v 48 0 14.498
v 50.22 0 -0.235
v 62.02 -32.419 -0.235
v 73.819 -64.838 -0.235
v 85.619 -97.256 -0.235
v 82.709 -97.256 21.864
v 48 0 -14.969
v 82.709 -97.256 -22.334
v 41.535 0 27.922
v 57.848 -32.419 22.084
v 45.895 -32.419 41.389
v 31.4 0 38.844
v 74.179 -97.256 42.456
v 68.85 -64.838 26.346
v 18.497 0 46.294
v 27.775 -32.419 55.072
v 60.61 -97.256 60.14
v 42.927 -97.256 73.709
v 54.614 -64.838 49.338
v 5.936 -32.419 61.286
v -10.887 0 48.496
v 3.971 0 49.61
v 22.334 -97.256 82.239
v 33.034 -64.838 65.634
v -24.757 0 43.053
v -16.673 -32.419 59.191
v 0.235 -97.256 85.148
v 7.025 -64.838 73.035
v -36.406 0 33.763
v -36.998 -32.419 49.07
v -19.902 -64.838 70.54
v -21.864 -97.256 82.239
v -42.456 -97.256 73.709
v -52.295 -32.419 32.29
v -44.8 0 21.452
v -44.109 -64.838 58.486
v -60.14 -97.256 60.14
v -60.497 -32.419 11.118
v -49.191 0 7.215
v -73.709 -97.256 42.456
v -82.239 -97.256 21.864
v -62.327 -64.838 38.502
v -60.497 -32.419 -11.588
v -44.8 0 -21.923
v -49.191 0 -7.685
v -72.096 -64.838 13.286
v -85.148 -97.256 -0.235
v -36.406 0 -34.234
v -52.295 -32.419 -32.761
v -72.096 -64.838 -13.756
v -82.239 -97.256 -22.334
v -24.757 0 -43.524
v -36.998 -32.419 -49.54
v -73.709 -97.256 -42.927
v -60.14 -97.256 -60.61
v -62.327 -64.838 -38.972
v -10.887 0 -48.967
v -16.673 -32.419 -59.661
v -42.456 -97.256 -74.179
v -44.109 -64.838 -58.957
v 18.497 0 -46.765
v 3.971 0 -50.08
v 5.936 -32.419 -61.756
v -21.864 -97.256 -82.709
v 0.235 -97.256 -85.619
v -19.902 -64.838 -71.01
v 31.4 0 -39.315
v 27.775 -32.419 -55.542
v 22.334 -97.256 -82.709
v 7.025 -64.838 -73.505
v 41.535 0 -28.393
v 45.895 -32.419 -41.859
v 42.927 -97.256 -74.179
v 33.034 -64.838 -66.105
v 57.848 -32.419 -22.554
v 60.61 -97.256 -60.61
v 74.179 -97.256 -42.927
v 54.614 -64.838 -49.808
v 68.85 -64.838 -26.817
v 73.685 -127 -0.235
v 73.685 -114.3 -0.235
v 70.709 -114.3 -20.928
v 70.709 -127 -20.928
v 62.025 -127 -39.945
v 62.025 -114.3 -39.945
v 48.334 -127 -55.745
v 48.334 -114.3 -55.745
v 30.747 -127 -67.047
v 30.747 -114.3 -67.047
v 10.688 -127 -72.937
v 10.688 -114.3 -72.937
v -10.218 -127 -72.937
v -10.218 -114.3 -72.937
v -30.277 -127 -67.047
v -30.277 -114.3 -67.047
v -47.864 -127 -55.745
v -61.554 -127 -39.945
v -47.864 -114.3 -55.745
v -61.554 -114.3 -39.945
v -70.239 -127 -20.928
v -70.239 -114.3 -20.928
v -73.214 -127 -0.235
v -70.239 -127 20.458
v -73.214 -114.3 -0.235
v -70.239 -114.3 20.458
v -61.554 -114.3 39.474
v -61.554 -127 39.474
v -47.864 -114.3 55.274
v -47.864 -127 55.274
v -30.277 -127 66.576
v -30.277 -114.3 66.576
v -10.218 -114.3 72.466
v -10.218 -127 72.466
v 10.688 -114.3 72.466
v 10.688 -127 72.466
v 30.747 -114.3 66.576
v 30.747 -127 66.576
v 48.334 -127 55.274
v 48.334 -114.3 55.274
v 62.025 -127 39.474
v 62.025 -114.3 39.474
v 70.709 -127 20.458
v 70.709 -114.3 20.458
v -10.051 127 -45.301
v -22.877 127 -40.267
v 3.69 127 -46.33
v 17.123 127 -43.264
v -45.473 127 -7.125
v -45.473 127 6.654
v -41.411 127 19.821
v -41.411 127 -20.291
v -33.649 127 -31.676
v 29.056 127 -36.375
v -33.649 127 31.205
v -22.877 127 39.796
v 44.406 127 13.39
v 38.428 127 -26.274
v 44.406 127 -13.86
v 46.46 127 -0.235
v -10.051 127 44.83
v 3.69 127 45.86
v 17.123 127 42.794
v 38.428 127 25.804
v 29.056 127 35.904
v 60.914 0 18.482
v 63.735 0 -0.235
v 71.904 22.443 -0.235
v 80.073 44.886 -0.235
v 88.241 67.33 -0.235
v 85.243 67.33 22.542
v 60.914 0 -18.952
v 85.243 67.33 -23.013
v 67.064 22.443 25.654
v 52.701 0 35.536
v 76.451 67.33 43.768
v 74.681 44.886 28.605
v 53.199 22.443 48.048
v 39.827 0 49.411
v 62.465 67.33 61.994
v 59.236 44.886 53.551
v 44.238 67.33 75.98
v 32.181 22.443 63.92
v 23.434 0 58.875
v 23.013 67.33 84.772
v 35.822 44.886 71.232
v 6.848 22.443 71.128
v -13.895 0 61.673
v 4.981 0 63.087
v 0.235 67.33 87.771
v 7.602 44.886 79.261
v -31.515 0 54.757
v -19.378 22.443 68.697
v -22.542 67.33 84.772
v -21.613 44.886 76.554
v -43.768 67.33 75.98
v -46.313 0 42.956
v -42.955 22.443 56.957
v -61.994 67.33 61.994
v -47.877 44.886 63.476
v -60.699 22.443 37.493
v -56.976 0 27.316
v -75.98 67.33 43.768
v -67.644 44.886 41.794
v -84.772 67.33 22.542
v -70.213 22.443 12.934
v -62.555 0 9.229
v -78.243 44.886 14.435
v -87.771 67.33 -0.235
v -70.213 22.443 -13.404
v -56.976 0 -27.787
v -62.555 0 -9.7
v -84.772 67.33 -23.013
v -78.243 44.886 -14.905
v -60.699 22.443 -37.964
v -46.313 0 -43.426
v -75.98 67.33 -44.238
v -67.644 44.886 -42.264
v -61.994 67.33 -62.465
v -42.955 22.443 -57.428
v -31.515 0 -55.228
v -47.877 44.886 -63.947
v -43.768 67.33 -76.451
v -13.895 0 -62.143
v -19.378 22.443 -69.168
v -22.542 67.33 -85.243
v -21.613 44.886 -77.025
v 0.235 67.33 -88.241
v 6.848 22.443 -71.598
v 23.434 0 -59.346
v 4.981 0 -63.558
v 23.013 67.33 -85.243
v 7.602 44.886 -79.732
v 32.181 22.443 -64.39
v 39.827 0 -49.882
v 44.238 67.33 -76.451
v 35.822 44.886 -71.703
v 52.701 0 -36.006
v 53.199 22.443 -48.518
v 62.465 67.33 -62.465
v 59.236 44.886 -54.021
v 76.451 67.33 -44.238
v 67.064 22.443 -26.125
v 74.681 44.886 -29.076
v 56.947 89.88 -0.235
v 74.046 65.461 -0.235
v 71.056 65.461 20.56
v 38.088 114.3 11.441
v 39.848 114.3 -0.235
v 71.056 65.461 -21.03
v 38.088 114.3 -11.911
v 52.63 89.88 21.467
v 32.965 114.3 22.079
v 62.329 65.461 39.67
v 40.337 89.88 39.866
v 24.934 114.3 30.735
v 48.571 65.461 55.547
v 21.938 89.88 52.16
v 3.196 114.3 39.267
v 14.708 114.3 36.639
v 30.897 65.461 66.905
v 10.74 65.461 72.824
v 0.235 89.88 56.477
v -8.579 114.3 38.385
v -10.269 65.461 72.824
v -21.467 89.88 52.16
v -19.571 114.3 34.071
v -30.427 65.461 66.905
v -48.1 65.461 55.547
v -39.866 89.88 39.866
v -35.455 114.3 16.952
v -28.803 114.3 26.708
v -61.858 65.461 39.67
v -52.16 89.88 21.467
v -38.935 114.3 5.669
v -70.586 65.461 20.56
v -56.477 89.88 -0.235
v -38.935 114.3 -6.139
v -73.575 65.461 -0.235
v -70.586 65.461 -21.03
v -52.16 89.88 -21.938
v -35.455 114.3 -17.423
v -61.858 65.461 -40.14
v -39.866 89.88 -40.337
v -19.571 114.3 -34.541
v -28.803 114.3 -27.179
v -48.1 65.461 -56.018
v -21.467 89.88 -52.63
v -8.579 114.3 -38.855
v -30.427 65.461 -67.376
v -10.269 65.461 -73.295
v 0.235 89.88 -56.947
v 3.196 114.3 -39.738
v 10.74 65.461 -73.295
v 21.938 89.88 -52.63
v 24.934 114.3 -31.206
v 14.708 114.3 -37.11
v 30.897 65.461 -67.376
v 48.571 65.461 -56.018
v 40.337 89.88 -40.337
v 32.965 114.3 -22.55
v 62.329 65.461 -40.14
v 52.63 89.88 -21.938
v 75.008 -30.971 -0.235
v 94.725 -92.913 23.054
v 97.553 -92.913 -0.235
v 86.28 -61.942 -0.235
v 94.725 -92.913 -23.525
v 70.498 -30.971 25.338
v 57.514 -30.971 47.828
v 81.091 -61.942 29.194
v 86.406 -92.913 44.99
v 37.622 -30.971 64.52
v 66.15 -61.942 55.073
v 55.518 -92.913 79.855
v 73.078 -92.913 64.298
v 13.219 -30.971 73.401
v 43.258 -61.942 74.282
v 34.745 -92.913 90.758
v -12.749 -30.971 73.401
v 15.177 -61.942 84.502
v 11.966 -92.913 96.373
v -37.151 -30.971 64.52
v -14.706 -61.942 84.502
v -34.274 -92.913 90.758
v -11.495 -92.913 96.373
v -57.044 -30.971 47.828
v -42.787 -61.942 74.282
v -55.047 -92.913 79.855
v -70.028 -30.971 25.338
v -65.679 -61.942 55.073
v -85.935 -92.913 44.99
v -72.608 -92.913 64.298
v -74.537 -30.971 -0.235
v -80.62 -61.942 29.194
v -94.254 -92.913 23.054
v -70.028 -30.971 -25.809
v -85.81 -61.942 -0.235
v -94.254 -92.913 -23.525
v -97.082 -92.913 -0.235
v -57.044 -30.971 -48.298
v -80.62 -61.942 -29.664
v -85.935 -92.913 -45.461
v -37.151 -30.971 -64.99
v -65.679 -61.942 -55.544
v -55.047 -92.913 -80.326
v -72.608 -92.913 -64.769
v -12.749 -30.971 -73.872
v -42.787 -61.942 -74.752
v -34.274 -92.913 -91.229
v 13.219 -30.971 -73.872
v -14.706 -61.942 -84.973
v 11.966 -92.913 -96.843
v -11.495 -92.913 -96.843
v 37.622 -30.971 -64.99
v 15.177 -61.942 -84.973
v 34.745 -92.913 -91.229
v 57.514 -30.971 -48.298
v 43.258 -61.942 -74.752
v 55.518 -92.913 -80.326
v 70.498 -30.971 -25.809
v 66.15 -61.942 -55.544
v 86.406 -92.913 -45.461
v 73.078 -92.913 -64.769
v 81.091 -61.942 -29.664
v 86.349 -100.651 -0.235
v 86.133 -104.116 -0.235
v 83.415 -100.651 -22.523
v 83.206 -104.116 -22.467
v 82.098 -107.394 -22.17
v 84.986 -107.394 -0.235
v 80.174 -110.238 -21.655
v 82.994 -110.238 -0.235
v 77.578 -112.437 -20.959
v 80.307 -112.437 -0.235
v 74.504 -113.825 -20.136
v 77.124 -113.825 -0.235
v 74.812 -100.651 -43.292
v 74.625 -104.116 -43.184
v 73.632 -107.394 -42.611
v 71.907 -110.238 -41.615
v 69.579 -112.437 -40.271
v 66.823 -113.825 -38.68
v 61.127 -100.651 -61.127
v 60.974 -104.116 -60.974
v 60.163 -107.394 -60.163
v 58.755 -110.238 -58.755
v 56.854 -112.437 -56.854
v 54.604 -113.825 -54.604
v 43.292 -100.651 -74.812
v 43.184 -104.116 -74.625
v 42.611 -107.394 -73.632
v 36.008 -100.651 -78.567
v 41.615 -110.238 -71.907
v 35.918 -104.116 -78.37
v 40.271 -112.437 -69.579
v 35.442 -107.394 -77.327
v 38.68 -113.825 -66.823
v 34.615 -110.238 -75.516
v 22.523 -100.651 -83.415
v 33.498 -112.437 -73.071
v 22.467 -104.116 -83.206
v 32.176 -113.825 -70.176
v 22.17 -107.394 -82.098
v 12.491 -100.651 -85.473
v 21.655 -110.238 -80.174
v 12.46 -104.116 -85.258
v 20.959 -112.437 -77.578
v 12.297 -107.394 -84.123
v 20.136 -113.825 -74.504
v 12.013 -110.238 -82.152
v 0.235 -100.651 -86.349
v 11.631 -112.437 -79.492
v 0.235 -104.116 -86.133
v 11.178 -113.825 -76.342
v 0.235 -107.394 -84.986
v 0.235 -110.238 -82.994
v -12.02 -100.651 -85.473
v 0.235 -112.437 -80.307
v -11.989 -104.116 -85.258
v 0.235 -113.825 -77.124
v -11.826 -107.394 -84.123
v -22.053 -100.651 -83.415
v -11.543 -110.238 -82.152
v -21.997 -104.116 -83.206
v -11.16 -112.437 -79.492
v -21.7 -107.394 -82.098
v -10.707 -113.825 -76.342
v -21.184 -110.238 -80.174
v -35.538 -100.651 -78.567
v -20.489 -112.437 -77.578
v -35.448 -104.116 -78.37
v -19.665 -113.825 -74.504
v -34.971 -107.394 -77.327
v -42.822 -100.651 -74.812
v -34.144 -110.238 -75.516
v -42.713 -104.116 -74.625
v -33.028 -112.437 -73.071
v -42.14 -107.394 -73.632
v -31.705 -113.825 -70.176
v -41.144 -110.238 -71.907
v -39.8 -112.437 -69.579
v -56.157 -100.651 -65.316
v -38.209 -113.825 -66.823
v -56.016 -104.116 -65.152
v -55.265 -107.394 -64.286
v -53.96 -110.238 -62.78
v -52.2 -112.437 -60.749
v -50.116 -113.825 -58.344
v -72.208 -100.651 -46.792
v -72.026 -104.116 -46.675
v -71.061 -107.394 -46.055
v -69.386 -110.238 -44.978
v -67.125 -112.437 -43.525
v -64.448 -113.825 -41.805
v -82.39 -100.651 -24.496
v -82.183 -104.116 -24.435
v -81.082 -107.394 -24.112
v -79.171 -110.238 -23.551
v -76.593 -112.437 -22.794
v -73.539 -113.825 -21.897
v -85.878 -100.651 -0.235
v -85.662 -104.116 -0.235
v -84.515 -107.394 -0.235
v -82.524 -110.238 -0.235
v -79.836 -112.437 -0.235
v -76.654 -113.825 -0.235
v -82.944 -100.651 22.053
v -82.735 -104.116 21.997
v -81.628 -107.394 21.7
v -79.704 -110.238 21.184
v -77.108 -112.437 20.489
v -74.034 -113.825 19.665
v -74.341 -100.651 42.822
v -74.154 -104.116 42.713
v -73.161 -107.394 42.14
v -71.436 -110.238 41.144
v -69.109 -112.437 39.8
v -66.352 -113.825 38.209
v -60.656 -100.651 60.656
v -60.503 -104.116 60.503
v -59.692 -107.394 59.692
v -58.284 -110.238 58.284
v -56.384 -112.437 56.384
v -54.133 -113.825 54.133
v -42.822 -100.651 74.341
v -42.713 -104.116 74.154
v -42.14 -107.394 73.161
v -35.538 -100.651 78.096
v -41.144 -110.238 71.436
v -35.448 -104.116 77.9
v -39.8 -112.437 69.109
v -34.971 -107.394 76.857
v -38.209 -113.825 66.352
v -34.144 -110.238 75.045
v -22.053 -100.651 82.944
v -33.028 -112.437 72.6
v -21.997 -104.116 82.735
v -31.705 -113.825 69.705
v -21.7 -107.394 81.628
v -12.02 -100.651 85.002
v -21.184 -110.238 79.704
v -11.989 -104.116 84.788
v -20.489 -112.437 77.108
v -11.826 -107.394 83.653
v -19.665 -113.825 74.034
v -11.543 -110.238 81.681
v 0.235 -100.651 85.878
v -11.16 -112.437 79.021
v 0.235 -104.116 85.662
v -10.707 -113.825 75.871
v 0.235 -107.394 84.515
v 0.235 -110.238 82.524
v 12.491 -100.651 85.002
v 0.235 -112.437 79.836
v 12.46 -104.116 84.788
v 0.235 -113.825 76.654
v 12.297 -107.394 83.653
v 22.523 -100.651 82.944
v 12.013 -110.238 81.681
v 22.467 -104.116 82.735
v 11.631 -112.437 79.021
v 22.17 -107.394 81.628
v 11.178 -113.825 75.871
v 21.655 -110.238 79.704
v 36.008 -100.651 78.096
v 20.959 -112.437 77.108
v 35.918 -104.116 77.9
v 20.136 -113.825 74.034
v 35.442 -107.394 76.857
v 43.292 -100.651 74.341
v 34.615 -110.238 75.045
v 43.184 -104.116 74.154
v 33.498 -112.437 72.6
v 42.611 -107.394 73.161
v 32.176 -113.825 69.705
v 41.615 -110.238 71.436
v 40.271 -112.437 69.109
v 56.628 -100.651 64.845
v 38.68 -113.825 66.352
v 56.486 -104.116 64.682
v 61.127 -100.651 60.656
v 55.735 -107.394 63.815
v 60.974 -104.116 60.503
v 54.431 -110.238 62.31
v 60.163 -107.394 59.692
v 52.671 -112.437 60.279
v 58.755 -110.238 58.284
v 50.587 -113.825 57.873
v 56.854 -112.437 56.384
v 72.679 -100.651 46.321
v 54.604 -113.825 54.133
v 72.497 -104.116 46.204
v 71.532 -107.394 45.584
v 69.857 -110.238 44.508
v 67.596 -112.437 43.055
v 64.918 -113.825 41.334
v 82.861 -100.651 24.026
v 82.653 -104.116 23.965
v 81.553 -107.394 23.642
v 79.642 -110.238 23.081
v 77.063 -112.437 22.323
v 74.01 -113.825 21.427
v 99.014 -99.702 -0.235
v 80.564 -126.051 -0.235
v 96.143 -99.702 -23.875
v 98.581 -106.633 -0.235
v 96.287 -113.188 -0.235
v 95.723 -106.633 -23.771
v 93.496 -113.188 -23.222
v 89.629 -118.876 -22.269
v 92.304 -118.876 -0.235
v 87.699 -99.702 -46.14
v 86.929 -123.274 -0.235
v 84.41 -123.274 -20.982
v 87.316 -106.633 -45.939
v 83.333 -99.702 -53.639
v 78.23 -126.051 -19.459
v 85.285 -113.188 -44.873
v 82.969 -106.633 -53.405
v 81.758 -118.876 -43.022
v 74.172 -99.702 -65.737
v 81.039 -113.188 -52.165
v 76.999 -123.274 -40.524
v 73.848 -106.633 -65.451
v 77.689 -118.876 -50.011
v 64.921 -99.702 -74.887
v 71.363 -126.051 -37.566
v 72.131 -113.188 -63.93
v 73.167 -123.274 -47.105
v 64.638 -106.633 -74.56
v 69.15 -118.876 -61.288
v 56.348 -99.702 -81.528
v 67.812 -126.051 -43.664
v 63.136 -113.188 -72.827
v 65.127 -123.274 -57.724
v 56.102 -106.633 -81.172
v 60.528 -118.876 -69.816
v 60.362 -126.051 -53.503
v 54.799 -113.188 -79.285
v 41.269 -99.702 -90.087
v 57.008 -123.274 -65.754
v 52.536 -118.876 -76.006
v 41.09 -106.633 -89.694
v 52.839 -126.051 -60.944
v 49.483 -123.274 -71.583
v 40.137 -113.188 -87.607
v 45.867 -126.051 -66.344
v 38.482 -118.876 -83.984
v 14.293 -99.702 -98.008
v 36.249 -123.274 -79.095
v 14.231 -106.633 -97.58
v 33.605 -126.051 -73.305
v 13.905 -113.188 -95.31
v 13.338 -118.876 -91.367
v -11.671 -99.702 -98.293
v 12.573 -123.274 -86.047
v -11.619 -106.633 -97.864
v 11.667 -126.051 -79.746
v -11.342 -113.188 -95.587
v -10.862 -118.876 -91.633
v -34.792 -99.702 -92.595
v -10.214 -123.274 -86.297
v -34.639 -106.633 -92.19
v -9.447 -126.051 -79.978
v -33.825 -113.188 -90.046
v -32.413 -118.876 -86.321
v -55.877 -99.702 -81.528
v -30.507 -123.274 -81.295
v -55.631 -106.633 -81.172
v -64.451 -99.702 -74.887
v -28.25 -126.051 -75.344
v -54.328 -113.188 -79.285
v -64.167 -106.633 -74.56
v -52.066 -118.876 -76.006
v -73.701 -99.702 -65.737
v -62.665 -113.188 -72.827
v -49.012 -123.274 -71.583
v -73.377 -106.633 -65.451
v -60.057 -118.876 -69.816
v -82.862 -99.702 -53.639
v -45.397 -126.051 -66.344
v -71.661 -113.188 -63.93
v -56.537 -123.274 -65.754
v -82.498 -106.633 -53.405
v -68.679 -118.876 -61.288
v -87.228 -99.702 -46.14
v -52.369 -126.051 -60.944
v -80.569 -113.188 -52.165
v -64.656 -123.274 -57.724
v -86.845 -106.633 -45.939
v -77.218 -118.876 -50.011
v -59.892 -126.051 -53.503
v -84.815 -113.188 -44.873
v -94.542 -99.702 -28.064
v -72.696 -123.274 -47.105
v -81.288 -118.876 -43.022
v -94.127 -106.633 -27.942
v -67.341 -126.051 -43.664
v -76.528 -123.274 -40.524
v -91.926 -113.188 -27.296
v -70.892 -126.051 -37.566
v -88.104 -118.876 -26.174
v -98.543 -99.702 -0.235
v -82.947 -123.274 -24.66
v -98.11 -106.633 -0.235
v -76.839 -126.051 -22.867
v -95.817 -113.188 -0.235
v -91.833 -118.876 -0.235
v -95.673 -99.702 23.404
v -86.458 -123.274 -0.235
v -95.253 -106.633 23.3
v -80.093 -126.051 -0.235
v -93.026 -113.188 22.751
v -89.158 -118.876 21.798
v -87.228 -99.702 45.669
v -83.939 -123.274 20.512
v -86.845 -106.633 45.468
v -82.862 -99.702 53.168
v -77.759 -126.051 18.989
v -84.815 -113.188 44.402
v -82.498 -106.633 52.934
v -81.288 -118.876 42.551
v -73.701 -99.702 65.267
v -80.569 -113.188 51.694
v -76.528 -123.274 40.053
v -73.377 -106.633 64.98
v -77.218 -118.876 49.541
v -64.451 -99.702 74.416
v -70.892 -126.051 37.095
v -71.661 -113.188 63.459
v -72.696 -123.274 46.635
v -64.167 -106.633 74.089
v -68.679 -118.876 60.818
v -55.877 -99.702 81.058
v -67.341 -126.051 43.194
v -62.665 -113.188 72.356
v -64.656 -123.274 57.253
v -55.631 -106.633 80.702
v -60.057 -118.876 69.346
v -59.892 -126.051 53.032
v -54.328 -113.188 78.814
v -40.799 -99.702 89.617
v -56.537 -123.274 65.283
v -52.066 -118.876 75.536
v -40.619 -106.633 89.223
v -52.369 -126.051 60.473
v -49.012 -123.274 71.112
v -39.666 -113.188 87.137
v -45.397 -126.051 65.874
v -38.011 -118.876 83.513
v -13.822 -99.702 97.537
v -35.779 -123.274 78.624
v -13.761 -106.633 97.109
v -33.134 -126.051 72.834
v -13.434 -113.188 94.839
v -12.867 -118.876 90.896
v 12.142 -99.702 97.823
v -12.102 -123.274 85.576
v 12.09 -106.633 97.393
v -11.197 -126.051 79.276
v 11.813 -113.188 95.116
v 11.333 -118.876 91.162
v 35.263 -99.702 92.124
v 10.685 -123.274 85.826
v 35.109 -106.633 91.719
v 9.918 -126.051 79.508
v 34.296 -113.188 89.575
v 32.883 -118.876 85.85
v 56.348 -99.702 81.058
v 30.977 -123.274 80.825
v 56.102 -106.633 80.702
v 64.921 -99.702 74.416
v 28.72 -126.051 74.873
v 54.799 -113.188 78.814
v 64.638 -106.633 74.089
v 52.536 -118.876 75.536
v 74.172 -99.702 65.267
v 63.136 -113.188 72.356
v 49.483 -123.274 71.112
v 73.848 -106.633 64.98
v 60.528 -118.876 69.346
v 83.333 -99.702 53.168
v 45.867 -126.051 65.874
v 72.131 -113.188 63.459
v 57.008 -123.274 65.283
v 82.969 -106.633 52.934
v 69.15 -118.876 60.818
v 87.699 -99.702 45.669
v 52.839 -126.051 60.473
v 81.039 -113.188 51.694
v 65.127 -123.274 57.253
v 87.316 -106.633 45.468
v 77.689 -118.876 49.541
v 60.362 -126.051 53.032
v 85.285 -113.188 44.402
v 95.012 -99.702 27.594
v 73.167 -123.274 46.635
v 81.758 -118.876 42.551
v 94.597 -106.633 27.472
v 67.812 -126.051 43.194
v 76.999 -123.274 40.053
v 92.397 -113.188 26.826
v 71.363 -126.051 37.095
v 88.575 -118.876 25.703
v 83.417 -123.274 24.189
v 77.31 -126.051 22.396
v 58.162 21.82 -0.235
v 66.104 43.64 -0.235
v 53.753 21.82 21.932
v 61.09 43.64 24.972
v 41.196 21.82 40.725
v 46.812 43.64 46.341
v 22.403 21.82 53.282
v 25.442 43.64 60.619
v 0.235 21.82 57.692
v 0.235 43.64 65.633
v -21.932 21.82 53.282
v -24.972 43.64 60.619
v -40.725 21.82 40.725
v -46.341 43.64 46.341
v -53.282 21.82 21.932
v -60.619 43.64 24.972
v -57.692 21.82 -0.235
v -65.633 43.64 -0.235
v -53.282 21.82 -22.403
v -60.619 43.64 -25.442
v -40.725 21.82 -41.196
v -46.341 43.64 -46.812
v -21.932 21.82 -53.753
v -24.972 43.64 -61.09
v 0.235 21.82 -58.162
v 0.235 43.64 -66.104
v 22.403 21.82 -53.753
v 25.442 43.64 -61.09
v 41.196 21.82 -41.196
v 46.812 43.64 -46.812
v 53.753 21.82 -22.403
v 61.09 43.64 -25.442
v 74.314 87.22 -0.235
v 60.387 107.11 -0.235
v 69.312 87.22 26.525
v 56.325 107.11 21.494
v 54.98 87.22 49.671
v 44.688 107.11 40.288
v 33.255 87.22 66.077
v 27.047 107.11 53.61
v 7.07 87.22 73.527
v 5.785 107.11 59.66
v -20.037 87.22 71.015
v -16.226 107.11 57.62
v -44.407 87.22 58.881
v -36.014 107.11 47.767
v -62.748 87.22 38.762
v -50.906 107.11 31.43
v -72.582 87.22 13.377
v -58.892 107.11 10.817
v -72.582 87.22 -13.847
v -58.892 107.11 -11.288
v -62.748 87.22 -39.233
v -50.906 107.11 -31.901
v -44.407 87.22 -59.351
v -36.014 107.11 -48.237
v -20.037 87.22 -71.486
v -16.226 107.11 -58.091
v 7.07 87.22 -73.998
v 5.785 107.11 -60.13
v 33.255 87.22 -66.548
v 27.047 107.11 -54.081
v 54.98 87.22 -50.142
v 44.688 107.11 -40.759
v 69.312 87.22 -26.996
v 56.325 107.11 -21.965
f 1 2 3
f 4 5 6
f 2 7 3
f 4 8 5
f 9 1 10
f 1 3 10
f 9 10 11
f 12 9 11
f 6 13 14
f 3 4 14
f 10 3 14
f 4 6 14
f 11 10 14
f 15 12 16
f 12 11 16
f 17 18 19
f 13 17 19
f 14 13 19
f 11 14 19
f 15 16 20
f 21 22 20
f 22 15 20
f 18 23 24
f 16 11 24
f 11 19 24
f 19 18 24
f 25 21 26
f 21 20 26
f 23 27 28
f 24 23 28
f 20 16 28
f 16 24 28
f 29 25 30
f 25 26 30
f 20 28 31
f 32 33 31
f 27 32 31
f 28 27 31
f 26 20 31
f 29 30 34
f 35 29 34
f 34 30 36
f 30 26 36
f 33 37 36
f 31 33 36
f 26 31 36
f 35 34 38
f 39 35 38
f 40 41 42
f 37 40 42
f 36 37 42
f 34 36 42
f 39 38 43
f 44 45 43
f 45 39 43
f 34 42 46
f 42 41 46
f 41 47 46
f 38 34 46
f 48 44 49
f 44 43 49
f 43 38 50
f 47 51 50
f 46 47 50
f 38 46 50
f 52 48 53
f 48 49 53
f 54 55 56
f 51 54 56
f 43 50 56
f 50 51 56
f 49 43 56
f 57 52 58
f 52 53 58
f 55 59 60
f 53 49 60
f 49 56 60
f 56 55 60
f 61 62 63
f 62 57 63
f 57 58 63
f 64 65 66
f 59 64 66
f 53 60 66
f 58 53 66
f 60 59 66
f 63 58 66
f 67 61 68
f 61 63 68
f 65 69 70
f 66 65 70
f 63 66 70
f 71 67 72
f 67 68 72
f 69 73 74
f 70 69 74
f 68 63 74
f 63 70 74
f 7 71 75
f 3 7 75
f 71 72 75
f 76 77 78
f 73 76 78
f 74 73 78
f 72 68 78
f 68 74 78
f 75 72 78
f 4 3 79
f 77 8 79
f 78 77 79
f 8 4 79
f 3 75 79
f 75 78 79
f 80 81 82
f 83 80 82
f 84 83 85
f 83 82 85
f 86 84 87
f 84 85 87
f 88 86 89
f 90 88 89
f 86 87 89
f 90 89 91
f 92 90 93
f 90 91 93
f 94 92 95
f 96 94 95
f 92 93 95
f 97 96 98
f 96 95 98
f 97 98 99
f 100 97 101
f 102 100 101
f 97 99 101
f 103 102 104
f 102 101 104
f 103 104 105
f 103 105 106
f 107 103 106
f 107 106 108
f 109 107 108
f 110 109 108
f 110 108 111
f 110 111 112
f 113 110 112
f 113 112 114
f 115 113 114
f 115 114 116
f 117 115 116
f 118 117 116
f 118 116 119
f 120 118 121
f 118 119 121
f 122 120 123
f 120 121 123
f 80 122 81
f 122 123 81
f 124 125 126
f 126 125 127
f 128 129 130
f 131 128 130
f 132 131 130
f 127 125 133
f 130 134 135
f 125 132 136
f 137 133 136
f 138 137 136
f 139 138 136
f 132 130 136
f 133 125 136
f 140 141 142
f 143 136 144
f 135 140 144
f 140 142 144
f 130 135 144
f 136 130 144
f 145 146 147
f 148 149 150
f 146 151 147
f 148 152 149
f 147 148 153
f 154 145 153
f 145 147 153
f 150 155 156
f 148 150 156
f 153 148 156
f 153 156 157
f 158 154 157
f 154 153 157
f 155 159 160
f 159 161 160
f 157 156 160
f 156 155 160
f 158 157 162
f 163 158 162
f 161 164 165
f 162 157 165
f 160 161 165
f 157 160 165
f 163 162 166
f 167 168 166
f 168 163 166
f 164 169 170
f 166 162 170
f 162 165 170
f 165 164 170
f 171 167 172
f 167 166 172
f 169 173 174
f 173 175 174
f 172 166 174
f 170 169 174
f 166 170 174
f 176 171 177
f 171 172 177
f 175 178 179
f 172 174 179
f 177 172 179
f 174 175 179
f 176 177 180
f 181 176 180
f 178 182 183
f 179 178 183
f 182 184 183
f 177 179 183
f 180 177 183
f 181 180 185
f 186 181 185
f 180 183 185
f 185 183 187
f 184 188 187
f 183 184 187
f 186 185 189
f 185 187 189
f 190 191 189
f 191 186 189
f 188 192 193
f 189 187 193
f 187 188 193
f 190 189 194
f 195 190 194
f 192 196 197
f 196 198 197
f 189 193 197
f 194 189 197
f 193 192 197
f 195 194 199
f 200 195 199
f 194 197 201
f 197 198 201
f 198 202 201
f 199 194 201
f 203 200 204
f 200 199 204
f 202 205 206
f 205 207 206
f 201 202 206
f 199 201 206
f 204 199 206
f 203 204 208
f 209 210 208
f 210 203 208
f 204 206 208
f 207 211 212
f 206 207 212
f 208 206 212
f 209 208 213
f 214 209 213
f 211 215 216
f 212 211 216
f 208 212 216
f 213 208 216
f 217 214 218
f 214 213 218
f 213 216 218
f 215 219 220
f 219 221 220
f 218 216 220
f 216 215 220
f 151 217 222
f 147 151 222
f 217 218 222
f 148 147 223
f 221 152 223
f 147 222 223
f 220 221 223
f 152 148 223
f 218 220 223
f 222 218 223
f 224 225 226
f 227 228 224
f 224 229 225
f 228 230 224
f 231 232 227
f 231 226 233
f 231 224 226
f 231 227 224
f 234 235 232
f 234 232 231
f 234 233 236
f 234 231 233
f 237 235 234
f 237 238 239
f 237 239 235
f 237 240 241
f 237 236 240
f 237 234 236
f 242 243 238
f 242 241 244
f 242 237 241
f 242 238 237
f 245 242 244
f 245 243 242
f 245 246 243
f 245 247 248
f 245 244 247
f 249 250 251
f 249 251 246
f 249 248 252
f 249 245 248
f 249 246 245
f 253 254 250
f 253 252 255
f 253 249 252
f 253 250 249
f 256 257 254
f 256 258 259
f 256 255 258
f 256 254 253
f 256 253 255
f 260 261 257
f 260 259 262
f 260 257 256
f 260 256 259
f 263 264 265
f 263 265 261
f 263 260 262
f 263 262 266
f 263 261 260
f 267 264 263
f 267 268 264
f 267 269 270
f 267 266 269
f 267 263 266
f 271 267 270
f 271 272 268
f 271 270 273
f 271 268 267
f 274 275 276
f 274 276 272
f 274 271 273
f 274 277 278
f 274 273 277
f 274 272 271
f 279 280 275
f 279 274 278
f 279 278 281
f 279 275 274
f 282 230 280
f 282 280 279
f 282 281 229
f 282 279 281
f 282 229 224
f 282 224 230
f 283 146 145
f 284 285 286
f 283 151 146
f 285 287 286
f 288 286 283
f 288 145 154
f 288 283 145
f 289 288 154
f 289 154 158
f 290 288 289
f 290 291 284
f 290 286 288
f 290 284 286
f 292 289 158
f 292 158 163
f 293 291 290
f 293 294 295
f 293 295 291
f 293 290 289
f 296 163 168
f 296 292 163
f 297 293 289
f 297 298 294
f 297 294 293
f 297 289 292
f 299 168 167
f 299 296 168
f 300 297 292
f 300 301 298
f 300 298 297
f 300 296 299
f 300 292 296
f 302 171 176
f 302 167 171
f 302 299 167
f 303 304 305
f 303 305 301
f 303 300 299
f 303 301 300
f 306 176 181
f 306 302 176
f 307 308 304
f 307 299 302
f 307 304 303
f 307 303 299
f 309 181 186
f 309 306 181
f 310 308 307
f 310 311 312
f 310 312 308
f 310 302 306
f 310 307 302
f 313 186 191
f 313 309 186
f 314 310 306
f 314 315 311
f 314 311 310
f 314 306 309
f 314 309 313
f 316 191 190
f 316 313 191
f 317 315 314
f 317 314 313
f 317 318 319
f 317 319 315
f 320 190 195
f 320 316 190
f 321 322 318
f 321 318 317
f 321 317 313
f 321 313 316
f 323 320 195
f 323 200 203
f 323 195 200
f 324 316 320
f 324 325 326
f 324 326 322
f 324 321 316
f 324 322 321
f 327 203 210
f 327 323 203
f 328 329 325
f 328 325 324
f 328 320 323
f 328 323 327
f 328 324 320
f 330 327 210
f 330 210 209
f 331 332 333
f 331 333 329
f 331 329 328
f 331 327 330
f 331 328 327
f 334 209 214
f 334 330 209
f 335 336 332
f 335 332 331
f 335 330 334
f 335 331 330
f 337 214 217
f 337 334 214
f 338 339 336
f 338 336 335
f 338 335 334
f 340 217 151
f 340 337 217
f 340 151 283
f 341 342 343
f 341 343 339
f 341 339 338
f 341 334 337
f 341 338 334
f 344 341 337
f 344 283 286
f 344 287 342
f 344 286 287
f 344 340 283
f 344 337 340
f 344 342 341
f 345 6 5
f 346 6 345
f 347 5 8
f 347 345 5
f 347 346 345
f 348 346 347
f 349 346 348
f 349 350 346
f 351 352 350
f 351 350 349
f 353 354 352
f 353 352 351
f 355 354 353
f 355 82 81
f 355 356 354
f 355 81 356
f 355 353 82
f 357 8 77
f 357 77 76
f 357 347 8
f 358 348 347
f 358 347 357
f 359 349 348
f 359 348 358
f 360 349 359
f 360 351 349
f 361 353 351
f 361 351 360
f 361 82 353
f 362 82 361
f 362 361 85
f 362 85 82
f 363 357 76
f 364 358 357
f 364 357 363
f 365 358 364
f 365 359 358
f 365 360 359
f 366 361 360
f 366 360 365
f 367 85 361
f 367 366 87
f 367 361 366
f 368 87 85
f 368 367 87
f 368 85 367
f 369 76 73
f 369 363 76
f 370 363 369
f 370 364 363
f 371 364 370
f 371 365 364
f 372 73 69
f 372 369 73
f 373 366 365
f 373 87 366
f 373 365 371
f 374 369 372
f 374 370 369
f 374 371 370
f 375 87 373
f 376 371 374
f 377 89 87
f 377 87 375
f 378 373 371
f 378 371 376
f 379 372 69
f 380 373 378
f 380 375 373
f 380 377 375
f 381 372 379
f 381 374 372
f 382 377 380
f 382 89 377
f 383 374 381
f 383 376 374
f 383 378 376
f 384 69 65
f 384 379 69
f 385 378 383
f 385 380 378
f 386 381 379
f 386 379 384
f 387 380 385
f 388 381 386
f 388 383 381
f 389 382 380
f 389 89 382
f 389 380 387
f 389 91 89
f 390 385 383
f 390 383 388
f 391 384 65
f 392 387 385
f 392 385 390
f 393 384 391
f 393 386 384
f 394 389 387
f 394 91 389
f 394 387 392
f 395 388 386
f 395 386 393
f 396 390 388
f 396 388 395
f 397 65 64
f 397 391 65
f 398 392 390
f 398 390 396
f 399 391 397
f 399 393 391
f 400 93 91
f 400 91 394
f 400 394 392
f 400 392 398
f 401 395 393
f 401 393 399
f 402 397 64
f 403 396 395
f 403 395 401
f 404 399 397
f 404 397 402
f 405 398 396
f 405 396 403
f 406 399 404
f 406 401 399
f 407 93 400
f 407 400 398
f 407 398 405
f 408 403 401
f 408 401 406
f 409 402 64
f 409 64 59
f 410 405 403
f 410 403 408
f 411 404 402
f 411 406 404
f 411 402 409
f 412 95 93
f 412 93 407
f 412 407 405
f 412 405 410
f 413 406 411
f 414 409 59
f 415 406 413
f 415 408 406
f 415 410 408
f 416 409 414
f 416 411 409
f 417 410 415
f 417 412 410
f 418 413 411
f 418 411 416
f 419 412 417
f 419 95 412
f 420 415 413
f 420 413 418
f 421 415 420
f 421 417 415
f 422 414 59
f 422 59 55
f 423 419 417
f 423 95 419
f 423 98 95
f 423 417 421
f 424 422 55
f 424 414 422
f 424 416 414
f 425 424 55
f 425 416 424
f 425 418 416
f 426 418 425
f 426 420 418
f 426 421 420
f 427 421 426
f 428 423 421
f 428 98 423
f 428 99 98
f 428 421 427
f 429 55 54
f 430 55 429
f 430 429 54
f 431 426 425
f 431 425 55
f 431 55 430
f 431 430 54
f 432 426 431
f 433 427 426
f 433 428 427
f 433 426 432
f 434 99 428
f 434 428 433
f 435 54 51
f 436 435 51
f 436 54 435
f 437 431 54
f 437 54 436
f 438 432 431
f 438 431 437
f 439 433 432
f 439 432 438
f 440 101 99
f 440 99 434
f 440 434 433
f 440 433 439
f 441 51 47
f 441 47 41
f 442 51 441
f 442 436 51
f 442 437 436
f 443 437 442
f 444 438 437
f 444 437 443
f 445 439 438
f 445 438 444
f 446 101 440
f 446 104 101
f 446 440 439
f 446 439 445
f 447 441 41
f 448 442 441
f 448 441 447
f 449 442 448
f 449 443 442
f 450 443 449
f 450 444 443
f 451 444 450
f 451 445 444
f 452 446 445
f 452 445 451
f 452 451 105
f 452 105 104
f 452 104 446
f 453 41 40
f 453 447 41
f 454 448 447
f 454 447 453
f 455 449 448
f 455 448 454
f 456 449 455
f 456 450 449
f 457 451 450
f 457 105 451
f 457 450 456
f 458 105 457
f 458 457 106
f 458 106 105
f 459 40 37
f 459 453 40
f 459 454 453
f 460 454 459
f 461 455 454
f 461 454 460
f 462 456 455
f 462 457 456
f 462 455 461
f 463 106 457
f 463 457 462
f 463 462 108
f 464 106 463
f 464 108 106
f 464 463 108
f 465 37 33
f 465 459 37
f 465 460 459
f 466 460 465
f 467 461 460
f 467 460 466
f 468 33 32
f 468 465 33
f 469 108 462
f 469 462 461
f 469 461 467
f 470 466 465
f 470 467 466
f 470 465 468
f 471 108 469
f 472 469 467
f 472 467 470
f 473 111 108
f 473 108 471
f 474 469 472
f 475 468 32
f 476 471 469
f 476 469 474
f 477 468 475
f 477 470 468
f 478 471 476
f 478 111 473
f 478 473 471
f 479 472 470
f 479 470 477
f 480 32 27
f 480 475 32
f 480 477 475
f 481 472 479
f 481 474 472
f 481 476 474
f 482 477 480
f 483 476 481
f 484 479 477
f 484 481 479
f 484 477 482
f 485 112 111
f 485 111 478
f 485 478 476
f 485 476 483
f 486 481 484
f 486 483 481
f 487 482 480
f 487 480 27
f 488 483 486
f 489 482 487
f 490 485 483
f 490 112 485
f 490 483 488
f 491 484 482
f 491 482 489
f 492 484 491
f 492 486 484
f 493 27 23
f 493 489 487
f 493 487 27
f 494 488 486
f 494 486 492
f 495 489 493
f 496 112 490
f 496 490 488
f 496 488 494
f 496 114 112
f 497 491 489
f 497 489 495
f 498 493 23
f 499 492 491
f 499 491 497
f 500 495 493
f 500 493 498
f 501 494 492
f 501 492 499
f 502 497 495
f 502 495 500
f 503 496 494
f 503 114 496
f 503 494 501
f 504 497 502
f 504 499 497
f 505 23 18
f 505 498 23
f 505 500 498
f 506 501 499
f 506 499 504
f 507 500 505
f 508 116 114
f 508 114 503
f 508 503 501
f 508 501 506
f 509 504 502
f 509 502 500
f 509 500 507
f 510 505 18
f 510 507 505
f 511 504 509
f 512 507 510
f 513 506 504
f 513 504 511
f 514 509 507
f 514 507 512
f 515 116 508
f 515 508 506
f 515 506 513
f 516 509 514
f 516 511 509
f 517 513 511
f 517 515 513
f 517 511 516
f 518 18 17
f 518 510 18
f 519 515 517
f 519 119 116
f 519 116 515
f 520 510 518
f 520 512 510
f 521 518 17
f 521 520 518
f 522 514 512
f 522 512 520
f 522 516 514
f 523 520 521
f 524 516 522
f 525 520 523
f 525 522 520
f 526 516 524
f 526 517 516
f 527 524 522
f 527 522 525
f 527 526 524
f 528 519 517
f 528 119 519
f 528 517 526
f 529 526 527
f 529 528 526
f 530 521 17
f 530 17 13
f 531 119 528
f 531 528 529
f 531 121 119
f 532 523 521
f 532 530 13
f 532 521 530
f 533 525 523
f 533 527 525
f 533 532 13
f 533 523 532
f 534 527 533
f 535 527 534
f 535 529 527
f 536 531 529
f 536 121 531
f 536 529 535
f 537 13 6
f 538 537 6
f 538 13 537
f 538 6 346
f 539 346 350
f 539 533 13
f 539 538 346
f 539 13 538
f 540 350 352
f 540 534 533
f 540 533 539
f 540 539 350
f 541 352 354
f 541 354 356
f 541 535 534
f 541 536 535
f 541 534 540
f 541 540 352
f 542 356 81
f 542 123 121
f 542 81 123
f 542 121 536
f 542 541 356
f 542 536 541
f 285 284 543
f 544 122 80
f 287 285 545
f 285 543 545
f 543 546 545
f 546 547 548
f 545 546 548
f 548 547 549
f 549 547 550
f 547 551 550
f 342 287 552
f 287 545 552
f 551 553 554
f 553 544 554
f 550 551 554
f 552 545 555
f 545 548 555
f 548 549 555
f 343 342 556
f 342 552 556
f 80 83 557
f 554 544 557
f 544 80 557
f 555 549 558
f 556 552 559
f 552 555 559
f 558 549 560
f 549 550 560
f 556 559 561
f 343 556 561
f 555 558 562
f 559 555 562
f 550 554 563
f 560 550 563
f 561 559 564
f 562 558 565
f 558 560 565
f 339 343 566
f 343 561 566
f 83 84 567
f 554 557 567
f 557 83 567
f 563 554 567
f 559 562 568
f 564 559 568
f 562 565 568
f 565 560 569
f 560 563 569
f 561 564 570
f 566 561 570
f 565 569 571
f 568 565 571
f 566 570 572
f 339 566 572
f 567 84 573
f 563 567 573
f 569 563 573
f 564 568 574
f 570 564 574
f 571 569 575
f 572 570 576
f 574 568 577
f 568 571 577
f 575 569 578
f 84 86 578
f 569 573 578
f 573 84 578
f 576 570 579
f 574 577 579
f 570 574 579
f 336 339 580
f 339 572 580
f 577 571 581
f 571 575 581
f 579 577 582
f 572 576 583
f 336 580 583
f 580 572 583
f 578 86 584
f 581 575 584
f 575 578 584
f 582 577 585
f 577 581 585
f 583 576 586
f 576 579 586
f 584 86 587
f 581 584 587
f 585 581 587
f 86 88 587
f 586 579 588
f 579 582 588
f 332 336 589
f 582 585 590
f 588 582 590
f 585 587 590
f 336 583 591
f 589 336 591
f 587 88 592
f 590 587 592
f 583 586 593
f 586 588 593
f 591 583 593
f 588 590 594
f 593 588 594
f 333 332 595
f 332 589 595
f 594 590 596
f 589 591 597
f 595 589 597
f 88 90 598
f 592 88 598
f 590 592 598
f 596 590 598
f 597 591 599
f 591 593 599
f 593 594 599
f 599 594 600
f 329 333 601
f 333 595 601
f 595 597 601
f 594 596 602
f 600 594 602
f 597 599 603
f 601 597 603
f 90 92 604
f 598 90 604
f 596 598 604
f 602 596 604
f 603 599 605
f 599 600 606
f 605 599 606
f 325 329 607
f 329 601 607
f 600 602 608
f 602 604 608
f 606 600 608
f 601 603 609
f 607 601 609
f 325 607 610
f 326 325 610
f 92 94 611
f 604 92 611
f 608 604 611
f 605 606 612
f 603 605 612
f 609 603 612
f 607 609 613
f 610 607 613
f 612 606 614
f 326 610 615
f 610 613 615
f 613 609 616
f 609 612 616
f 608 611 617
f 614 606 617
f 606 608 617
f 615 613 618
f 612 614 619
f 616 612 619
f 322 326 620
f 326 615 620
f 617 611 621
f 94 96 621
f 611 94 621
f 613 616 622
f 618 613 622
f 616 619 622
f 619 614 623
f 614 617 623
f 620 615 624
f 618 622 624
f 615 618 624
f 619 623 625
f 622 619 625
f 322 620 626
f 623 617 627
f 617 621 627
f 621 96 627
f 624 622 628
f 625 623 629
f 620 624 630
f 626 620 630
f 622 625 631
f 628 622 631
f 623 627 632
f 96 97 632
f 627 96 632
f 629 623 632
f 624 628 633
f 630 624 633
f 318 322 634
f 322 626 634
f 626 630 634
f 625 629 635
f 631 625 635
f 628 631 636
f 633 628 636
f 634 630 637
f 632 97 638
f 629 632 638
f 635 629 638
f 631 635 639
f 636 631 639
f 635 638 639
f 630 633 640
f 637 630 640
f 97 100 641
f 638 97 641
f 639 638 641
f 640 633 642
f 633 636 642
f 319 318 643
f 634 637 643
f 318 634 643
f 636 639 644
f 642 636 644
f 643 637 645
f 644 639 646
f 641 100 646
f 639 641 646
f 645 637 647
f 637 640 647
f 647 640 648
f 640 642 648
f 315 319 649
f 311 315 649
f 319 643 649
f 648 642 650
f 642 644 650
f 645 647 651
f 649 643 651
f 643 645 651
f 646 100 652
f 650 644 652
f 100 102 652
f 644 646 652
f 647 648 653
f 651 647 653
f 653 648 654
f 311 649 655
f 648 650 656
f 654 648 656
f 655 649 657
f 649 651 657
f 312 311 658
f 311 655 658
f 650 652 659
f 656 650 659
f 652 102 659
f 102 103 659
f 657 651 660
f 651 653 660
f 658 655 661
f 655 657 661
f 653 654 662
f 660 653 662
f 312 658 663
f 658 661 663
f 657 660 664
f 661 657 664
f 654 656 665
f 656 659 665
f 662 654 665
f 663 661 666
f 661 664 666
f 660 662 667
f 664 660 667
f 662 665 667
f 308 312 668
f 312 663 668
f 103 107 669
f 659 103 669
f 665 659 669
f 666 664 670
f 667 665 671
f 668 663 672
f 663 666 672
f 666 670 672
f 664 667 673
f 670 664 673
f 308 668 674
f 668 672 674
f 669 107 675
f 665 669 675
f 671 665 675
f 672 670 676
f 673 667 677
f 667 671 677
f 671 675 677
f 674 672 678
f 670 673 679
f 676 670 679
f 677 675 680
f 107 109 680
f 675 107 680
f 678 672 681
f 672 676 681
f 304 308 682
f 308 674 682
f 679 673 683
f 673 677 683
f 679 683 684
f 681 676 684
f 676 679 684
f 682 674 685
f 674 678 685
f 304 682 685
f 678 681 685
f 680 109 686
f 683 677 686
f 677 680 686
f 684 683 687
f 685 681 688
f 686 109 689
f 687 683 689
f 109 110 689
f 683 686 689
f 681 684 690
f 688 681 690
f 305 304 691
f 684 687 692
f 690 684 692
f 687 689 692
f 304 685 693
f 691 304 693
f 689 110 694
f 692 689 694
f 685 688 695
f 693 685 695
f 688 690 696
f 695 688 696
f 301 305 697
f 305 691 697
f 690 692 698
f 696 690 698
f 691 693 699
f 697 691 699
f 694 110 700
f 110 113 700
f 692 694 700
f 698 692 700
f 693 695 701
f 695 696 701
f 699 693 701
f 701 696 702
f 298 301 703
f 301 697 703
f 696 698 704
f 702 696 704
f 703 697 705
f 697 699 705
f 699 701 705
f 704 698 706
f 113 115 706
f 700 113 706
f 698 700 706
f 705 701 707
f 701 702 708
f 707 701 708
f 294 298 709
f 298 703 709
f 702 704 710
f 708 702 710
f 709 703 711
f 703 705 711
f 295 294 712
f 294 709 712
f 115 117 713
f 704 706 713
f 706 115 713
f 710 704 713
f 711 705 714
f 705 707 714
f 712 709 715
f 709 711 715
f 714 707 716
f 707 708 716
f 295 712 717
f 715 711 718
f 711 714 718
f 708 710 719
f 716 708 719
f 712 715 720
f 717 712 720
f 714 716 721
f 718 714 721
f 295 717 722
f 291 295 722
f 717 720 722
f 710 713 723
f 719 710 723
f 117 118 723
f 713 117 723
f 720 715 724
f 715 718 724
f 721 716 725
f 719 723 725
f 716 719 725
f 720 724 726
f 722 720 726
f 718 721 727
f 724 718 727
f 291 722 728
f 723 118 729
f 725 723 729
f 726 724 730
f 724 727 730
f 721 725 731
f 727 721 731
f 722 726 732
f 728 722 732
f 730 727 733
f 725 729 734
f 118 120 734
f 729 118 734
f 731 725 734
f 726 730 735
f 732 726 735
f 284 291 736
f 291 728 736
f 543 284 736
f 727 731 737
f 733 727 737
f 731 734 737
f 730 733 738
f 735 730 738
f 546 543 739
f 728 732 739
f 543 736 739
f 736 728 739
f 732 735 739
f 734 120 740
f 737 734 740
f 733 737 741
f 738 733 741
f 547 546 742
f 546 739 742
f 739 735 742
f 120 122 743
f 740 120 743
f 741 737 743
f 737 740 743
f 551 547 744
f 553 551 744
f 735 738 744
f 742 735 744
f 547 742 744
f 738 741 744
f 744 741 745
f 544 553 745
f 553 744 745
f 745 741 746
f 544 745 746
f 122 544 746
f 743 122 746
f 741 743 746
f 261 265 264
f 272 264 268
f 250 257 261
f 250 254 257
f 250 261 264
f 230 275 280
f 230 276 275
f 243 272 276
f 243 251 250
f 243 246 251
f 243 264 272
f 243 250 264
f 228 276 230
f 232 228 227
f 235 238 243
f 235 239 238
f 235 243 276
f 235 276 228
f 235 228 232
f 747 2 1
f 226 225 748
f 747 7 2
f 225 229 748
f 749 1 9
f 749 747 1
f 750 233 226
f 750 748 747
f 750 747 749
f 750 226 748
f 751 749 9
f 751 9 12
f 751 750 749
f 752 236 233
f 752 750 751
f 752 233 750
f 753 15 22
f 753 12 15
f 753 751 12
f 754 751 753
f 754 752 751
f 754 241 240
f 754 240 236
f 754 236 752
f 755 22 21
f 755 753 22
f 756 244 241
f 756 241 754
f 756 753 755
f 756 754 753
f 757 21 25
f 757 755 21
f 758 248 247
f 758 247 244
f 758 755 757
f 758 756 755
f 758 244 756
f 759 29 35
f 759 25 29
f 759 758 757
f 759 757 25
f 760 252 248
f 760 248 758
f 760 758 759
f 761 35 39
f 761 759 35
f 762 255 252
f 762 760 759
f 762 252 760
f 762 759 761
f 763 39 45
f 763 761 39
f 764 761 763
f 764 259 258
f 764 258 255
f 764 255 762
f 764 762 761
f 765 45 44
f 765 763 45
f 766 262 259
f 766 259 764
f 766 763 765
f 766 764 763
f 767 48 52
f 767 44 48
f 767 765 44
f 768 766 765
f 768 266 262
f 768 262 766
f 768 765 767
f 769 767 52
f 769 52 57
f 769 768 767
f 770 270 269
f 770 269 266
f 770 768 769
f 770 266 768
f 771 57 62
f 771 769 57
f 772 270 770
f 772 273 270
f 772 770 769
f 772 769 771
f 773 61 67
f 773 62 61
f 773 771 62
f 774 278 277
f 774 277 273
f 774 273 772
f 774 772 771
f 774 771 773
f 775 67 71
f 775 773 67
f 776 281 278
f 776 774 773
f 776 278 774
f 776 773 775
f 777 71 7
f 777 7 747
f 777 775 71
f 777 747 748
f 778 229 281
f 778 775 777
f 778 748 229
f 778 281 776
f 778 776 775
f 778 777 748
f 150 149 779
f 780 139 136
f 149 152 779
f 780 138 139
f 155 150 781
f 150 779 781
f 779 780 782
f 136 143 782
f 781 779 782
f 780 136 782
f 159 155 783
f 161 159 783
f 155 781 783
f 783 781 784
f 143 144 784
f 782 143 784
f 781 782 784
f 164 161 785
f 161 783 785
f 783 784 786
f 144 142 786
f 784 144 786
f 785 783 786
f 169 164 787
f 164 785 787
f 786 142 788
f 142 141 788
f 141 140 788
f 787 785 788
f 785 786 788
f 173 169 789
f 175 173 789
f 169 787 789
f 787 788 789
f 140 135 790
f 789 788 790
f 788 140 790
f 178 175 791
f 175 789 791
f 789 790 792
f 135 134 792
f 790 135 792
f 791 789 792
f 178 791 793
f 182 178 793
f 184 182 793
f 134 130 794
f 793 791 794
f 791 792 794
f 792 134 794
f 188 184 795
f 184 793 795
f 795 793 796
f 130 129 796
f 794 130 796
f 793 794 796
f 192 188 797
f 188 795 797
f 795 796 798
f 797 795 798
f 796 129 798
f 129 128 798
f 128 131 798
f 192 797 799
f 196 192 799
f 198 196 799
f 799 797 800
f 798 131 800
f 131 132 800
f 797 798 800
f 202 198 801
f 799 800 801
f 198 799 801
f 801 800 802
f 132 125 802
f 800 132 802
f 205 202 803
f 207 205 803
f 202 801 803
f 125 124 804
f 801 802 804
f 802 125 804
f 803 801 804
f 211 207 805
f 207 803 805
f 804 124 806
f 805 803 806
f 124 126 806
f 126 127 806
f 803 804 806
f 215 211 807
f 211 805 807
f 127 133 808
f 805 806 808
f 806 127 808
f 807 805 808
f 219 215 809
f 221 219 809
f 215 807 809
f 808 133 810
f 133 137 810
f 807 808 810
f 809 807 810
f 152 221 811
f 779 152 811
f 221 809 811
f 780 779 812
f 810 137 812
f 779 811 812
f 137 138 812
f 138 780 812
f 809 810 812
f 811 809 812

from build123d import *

# Parameters (mm, degrees)
F0_R     = 63.5
F1_DEPTH = 127
F1_TAPER = -20
F2_R     = 25.4
F3_SIZE  = 63.5
F4_T     = -12.7


# Not quite as in the source:
# - a shell that OpenCascade refuses in one call is made with other operations: the cavity is built on its own and cut out


with BuildPart() as f1:
    # F0 (on Front) → F1 (new body, symmetric)
    with BuildSketch(Plane.XZ):
        with Locations((0.2353243763, -0.2353235031)):
            Circle(F0_R)
    extrude(amount=F1_DEPTH, both=True, taper=F1_TAPER)

    # F2
    f2_edges = [f1.edges().sort_by_distance(p)[0] for p in [
        (-109.488895, -127, -0.235324),
    ]]
    fillet(f2_edges, radius=F2_R)

    # F3
    f3_edges = [f1.edges().sort_by_distance(p)[0] for p in [
        (-109.488895, 127, -0.235324),
    ]]
    chamfer(f3_edges, length=F3_SIZE)

    # F4: a shell. OpenCascade refuses it in one call, so the cavity is built on its own and cut out:
    # the body offset inwards by the wall thickness, plus a prism from it out through each open face.
    f4_core = offset(f1.part, amount=F4_T, kind=Kind.INTERSECTION, mode=Mode.PRIVATE)
    f4_exits = [f4_core.faces().sort_by_distance(p)[0] for p in [
        (0.235324, -114.3, -0.235324),
    ]]
    add(f4_core, mode=Mode.SUBTRACT)
    extrude(f4_exits, amount=-F4_T, mode=Mode.SUBTRACT)


solid = f1.part
